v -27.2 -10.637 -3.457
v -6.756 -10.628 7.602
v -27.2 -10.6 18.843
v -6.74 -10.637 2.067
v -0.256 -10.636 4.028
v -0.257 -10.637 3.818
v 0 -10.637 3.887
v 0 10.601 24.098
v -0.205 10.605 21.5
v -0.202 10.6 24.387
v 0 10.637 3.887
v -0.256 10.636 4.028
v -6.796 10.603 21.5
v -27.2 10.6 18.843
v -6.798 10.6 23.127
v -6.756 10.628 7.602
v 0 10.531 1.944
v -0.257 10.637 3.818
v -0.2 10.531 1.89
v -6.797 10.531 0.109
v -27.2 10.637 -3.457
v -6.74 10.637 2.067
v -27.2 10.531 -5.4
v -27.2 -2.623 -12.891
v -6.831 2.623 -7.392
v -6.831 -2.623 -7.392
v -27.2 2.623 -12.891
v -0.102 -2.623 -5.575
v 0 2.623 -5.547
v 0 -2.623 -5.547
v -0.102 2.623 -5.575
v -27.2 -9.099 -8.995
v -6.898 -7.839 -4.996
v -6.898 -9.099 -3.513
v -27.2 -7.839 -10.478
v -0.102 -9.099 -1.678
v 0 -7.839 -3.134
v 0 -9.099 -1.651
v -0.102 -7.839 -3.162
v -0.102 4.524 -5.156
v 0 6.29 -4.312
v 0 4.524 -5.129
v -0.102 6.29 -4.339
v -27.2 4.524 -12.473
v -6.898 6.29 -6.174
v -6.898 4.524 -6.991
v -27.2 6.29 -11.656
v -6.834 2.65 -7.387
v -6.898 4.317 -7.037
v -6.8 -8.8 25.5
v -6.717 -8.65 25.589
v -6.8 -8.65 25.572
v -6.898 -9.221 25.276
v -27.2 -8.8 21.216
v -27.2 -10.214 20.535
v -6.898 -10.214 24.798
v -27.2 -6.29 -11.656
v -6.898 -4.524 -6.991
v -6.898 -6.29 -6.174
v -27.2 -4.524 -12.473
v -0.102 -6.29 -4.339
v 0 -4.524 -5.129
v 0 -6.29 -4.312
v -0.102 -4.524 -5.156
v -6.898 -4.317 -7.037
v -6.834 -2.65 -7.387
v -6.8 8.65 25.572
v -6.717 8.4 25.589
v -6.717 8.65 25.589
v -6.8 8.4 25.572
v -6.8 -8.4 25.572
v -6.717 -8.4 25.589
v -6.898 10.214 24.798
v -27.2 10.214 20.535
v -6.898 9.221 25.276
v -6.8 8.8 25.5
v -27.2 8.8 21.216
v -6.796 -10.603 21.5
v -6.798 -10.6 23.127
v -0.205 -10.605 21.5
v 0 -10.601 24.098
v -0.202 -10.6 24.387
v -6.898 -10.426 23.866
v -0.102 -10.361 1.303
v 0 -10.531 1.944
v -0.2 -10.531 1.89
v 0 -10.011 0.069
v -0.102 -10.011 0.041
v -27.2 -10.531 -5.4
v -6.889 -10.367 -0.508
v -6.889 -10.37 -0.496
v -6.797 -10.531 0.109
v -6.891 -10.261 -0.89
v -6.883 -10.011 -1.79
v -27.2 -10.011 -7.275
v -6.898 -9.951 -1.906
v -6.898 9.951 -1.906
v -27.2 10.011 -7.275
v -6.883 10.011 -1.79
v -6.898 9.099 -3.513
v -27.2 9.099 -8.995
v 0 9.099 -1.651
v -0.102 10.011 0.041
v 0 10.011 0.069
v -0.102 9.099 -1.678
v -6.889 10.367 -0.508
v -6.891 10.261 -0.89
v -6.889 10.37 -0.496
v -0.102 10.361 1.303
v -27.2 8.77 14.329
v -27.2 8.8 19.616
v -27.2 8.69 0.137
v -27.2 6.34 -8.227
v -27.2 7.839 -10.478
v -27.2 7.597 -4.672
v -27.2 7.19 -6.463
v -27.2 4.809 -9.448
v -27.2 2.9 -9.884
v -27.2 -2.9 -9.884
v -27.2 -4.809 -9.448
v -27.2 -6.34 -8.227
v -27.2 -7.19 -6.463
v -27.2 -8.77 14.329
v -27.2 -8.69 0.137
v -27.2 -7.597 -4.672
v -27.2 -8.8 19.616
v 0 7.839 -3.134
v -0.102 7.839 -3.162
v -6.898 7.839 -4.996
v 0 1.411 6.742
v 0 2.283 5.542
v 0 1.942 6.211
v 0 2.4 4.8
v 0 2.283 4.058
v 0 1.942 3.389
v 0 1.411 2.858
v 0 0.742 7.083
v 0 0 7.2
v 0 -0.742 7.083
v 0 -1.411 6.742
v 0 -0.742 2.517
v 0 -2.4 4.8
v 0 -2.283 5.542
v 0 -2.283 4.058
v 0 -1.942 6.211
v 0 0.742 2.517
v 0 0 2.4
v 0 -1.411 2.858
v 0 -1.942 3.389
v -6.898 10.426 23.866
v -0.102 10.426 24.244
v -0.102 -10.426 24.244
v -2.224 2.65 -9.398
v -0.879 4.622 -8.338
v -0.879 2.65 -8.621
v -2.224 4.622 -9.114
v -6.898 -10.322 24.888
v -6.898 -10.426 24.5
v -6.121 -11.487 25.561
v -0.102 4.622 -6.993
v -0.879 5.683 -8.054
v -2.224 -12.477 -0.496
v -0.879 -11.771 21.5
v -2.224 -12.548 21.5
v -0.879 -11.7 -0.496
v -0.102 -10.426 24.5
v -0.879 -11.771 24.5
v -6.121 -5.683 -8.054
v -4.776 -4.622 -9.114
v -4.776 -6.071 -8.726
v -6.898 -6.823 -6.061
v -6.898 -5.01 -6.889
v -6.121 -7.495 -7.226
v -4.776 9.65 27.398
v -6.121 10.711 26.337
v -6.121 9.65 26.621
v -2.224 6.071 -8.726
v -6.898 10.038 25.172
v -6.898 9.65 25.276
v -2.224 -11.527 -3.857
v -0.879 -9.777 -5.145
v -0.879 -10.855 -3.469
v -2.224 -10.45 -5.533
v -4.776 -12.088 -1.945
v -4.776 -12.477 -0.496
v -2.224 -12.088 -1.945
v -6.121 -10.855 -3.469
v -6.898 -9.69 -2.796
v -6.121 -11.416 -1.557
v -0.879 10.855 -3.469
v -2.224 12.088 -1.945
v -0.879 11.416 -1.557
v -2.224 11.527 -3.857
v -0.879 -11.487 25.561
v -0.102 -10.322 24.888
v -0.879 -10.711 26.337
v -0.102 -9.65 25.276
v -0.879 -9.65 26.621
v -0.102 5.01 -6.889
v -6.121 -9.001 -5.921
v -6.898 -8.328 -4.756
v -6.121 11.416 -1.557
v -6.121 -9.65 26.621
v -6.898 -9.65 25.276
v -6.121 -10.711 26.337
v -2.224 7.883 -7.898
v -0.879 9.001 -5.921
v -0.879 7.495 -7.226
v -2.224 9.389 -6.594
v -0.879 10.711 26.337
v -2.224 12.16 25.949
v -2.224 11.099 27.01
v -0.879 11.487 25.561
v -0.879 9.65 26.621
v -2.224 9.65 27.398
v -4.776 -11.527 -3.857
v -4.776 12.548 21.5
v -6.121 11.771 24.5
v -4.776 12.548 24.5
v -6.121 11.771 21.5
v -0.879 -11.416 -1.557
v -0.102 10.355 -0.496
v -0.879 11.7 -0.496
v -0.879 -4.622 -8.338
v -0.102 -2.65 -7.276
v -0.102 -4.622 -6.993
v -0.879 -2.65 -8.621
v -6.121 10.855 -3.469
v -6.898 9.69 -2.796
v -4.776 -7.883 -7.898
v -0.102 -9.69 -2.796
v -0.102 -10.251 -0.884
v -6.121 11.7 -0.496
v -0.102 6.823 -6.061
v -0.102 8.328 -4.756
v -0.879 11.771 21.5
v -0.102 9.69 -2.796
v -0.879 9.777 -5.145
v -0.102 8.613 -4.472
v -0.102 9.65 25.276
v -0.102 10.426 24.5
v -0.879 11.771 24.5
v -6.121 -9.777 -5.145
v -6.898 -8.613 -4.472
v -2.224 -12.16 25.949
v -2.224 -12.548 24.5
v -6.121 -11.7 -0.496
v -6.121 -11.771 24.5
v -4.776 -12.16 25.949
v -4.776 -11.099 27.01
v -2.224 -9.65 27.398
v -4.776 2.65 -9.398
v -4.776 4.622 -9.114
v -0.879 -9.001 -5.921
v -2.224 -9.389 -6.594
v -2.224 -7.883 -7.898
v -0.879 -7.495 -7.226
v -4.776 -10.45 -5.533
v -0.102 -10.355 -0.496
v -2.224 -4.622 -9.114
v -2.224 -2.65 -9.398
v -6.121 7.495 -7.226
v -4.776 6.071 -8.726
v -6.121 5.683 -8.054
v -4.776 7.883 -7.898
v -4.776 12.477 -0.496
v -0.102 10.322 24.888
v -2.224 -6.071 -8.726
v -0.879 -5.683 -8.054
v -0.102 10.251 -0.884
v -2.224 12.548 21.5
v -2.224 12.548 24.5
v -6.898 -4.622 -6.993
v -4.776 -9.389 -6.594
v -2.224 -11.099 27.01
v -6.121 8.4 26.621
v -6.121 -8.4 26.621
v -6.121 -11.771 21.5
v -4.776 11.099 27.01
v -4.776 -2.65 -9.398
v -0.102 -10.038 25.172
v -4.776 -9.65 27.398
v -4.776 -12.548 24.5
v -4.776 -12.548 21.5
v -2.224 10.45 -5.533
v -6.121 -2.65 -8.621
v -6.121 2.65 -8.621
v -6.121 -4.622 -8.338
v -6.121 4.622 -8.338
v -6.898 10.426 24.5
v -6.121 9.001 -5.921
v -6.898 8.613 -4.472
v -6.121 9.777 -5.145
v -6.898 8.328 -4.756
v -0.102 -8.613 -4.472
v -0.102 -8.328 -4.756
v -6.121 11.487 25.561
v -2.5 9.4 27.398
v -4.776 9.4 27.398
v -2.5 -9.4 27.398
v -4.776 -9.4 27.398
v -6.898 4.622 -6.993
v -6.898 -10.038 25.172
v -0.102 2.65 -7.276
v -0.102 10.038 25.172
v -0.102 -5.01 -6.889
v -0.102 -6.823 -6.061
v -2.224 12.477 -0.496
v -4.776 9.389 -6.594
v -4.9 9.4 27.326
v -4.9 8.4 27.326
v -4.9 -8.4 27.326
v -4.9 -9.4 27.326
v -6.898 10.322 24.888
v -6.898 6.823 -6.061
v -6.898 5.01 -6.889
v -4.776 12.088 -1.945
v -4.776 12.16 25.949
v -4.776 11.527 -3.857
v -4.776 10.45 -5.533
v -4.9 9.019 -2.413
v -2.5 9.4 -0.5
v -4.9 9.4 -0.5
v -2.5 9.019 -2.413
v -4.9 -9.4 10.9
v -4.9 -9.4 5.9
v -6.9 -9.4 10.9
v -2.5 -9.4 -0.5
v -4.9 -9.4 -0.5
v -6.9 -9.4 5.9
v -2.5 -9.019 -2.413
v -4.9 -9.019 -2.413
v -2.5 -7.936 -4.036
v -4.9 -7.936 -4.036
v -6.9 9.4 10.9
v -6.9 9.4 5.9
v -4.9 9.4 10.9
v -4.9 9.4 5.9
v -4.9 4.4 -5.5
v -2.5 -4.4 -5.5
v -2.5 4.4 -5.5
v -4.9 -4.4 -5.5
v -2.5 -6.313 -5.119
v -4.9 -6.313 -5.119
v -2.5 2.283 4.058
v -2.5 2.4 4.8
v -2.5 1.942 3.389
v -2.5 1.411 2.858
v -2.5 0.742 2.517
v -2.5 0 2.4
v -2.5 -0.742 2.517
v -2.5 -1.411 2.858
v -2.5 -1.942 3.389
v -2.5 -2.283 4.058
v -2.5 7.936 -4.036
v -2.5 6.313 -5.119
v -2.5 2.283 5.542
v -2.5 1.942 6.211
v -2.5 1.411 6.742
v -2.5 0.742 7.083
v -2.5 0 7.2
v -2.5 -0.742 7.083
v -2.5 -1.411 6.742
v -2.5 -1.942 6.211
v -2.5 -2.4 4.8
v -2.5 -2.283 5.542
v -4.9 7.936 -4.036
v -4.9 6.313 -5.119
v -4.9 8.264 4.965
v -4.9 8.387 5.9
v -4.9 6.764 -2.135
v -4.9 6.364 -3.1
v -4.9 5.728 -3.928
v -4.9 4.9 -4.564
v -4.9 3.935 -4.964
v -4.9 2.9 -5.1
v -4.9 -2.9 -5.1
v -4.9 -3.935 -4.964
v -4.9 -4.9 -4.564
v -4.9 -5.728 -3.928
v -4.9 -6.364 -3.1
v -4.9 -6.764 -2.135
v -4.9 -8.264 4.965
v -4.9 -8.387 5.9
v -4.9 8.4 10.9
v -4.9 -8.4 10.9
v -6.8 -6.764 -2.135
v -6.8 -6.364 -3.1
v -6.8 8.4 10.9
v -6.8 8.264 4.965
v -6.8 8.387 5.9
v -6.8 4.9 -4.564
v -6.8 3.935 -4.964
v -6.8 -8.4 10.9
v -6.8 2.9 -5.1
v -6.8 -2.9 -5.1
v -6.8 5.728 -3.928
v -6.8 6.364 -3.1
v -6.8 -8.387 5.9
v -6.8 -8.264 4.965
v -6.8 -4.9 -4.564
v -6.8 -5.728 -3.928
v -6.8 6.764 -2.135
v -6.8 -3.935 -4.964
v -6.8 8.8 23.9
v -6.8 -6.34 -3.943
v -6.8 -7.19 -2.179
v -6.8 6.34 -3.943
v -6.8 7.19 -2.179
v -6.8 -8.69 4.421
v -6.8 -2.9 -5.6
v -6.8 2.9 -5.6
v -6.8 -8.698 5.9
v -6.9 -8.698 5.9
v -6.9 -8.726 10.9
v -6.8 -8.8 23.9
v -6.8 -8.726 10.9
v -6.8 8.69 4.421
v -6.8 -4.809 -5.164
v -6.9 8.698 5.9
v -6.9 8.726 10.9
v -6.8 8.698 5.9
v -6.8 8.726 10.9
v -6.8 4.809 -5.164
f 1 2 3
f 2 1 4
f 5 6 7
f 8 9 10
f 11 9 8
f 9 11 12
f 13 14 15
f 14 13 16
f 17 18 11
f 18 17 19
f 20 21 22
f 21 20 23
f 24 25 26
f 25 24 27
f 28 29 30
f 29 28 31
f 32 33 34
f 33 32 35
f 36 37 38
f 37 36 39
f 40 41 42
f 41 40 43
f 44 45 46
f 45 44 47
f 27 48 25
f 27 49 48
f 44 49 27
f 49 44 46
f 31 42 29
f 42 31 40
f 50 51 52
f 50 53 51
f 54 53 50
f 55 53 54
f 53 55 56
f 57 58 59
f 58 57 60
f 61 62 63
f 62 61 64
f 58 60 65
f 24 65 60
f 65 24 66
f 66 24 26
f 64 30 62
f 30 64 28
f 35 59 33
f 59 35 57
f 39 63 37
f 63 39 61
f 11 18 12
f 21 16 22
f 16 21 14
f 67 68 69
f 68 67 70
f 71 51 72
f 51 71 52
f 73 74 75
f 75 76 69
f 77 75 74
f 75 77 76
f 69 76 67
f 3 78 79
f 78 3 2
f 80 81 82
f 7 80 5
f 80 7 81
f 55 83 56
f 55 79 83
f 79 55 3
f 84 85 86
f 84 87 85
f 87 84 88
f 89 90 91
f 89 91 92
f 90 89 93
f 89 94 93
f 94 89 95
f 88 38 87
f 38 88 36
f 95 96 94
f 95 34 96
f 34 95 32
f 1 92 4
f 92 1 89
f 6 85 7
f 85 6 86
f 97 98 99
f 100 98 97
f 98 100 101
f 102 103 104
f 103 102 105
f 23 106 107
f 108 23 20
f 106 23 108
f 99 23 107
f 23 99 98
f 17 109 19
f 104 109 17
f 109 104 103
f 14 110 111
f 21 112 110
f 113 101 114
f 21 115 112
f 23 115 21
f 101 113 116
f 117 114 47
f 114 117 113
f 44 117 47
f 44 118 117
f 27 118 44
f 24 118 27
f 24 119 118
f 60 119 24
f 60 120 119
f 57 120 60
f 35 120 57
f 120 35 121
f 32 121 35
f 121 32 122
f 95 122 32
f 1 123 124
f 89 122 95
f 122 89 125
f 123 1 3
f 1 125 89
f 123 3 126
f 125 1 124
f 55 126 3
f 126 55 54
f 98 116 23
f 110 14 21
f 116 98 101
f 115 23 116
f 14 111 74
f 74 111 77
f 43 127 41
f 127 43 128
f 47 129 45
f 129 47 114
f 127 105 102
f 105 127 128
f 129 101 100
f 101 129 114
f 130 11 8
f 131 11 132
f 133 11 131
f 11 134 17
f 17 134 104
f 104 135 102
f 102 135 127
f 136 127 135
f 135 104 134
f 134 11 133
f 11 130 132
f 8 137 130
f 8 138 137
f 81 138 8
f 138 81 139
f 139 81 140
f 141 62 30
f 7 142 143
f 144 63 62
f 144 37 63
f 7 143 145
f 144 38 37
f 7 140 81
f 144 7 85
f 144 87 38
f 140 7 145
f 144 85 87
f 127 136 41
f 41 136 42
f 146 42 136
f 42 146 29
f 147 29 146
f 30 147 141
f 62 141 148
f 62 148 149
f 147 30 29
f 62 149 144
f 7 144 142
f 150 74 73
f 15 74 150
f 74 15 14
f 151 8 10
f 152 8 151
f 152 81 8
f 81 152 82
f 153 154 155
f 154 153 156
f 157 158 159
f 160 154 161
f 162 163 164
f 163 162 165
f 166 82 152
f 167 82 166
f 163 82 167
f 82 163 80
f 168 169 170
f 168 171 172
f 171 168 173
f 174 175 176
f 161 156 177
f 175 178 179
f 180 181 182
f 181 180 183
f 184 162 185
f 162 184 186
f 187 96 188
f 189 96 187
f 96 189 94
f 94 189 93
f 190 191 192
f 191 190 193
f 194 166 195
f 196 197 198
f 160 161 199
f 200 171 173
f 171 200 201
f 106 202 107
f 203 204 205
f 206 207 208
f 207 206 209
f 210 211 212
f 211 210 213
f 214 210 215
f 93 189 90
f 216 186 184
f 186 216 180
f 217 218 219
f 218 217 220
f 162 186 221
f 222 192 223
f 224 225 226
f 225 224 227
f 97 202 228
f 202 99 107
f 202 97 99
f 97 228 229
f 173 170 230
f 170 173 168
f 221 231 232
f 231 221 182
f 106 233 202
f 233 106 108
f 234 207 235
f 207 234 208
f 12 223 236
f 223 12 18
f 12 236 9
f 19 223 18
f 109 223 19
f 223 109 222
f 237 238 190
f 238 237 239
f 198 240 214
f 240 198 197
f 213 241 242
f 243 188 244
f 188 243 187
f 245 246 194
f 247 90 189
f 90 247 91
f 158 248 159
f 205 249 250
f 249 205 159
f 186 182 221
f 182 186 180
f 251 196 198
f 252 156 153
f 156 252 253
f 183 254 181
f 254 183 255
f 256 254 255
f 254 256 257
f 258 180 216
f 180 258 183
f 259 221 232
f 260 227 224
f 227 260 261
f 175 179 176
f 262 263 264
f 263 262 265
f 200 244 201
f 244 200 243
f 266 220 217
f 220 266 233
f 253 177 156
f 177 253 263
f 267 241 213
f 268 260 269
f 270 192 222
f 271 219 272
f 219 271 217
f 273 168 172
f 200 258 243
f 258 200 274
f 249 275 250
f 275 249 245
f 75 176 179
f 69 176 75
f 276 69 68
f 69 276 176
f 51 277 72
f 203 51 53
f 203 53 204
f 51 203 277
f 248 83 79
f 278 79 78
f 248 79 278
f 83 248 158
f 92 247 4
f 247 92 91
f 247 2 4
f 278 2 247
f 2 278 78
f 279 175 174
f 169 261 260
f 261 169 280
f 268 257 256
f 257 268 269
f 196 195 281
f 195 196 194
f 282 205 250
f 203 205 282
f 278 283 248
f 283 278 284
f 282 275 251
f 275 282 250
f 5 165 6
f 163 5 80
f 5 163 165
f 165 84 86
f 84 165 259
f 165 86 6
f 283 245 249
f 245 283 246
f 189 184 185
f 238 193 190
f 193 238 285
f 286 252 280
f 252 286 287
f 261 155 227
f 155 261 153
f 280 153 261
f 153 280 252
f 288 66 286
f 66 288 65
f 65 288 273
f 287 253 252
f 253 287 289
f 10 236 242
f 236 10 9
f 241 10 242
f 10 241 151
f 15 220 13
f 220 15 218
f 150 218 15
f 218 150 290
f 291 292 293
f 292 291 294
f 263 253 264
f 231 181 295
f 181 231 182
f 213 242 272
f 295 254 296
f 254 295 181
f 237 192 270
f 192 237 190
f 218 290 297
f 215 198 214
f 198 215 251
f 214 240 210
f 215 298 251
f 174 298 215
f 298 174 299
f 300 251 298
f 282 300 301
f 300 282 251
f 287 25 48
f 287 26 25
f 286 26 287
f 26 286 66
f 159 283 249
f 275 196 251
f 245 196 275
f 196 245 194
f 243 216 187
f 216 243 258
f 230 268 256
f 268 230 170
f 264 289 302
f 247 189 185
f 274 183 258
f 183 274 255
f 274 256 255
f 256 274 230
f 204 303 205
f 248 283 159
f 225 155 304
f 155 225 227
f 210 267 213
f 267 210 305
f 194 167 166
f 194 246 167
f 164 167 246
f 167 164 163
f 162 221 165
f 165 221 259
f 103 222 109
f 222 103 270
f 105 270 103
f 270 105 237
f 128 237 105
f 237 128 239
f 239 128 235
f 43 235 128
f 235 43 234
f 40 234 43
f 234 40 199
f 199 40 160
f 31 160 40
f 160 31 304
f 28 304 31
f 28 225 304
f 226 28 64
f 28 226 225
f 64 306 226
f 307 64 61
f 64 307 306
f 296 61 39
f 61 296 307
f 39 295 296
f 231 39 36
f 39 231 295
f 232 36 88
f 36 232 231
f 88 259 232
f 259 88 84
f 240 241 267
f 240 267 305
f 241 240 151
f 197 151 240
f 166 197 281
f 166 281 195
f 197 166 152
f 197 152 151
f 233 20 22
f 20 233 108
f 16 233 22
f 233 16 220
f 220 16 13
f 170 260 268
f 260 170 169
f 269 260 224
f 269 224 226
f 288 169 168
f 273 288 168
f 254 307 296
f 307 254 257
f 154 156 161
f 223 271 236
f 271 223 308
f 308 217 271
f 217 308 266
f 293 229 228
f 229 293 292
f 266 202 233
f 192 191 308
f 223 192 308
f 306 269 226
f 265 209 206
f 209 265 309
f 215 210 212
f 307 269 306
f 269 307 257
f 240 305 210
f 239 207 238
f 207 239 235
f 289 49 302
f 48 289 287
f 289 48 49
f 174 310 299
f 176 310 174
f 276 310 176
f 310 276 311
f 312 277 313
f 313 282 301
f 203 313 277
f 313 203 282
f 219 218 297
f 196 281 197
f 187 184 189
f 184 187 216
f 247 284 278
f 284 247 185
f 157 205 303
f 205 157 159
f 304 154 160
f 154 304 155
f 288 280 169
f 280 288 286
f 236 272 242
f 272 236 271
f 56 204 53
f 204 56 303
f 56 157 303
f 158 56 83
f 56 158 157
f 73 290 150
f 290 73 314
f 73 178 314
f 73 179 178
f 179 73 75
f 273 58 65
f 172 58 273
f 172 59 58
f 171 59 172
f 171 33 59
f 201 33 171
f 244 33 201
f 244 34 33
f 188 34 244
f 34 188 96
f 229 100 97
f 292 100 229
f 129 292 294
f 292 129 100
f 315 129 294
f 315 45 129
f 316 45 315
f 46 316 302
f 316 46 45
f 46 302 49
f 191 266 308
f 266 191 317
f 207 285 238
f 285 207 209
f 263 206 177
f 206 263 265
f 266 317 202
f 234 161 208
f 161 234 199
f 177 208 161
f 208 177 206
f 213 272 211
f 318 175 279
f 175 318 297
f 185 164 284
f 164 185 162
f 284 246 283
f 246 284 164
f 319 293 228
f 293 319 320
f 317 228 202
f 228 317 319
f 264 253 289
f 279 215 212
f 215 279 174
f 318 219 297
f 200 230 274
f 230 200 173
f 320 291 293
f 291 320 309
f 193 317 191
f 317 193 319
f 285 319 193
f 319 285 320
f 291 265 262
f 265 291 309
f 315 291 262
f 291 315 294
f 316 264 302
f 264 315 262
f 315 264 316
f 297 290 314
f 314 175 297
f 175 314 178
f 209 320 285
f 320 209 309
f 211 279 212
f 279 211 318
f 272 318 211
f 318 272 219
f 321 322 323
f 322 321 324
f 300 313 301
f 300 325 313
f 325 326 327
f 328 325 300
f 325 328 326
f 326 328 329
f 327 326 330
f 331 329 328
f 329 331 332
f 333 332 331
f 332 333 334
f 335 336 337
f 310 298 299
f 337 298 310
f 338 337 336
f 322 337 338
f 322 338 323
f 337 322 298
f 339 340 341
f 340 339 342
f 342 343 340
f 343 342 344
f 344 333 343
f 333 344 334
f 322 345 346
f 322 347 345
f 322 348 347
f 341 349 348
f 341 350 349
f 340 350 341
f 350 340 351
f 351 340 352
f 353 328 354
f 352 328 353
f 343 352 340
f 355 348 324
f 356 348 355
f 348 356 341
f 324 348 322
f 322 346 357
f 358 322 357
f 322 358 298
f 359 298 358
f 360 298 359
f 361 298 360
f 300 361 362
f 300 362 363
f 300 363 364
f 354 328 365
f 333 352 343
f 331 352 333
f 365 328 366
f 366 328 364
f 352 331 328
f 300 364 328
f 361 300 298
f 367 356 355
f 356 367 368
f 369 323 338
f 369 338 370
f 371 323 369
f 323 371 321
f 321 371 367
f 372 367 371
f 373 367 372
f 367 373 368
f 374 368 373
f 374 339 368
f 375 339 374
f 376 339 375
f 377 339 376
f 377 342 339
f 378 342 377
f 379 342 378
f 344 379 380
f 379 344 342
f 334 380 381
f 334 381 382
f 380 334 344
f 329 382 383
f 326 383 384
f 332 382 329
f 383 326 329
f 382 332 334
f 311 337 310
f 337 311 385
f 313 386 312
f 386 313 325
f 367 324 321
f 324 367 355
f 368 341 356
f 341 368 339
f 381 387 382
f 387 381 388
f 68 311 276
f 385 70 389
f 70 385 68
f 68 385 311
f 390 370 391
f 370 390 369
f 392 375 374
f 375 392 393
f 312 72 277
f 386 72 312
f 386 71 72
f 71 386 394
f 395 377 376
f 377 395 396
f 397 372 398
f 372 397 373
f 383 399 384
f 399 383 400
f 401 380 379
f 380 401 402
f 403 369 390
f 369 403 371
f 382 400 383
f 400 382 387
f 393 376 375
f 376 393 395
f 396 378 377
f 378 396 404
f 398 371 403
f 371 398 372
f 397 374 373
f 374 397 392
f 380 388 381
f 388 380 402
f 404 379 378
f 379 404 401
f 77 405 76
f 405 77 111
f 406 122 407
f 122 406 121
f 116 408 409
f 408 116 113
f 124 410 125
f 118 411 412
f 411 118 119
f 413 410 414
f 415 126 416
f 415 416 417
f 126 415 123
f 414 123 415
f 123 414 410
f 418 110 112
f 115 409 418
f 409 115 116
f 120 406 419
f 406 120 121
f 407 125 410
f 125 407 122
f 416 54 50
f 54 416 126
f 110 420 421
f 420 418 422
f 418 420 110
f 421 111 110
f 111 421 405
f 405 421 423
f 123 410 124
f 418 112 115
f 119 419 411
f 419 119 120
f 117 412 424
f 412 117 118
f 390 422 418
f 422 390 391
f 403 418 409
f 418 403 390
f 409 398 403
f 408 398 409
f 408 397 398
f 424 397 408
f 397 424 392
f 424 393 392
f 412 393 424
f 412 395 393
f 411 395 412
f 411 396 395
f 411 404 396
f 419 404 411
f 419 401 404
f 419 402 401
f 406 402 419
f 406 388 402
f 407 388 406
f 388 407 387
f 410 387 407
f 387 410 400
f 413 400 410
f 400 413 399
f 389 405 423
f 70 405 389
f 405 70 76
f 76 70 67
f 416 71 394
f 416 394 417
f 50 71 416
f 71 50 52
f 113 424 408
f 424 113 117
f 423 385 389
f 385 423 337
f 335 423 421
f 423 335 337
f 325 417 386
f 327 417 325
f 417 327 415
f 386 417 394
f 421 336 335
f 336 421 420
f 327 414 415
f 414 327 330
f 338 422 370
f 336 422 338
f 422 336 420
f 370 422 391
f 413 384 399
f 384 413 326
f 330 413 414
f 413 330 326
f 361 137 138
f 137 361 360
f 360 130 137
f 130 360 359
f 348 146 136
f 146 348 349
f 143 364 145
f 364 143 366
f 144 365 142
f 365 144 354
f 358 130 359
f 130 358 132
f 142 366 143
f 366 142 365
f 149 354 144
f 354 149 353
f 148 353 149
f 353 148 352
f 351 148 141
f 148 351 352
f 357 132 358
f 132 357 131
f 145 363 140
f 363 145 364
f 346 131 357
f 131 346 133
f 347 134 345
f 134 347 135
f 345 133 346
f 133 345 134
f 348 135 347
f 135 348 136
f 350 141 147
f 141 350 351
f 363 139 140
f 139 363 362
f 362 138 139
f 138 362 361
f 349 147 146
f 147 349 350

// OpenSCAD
//
// An extended bottom plate for the ETS 9-round magazine for Glock 42
//
// Copyright (c) 2019 Pete Zaitcev
//

// This is only an approximation. Actually the grip is a little narrower
// in the front than in the back. So, it mostly serves as a comment.
grip_w = 21.3;

module outer_mold () {

    strap_h = 27.2;
    front_r = 9.0;

    rear_r = 2.0;

    base_mr = 3.0;
    base_h = 7.0 - base_mr * 2;
    fr_base_r = 7.0;
    base_w = grip_w - base_mr * 2 + 4.0;

    off1 = grip_w / 2 - front_r;
    off2 = grip_w / 2 - rear_r;

    off_b1 = base_w / 2 - fr_base_r;

    // The main, taller part of the wrapping grip
    difference () {
        hull () {

            // This multmatrix is for the front strap.
            multmatrix(m = [[   1,   0,  -0.27,  0],
                            [   0,   1,   0,     0],
                            [   0,   0,   1,     0],
                            [   0,   0,   0,     1]])
            {

                translate([3.4, off1, strap_h/2])
                    cylinder(strap_h, front_r, front_r, center=true);
                translate([3.4, off1*-1, strap_h/2])
                    cylinder(strap_h, front_r, front_r, center=true);
            }

            // The tilt of the rear cut differs and matches the magazine.
            multmatrix(m = [[   1,   0,  -0.210, 0],
                            [   0,   1,   0,     0],
                            [   0,   0,   1,     0],
                            [   0,   0,   0,     1]])
            {
                translate([25.0, off2, strap_h/2])
                    cylinder(strap_h, rear_r, rear_r, center=true);
                translate([25.0, off2*-1, strap_h/2])
                    cylinder(strap_h, rear_r, rear_r, center=true);
            }
        }

        // A mostly cosmetic cut at the rear bottom
        translate([26.6, 0, -1.3])
            rotate(55, [0,1,0])
                cube([5, 30, 5], center=true);
    }

    // The base that adds rigidity and serves as a handle at the bottom
    minkowski () {
        hull () {
            translate([0.5, off_b1, base_h/2 + base_mr])
                cylinder(base_h, fr_base_r, fr_base_r, center=true);
            translate([0.5, off_b1*-1, base_h/2 + base_mr])
                cylinder(base_h, fr_base_r, fr_base_r, center=true);
            translate([23.0, 0, base_h/2 + base_mr])
                cube([3, base_w, base_h], center=true);
        }
        sphere(base_mr, $fn = 12);
    }
}

module main_cavity () {

    rail_h = 2.4;
    rail_w = 18.8;
    rail_r = 5.0;
    off_rail = rail_w/2 - rail_r;

    flange_h = 2.1; // actual 2.32, but material prints wider
    flange_w = 16.8;
    flange_r = 4.0;
    off_flange_2 = flange_w/2 - flange_r;
    off_flange_1 = flange_w/2 - flange_r - 1.5;

    cav_d = 40;    // magazine depth (at horizontal) is 30.6
    cav_w = 17.6;  // remember that the nose is narrower, to be done later
    cav_h = 28;    // bigger than strap_h
    cav_r = 4.4;
    off_cav_2 = cav_w/2 - cav_r;
    off_cav_1 = cav_w/2 - cav_r - 1.5;  // nose is significantly narrower

    // Layer 1 (from the bottom of the magazine body): the rail
    translate([0, 0, 0]) {
        hull () {
            translate([-0.5, off_rail, rail_h/2])
                cylinder(rail_h, rail_r, rail_r, center=true);
            translate([-0.5, off_rail*-1, rail_h/2])
                cylinder(rail_h, rail_r, rail_r, center=true);
            translate([26.0, 0, rail_h/2])
                cube([3, rail_w, rail_h], center=true);
        }
    }

    // Layer 2: the flange
    translate([0, 0, rail_h - 0.1]) {
        hull () {
            $fn = 24;

            translate([-1.1, off_flange_1, flange_h/2])
                cylinder(flange_h, flange_r, flange_r, center=true);
            translate([-1.1, off_flange_1*-1, flange_h/2])
                cylinder(flange_h, flange_r, flange_r, center=true);

            // middle
            translate([6.0, off_flange_2, flange_h/2])
                cylinder(flange_h, flange_r, flange_r, center=true);
            translate([6.0, off_flange_2*-1, flange_h/2])
                cylinder(flange_h, flange_r, flange_r, center=true);

            translate([26.0, 0, flange_h/2])
                cube([3, flange_w, flange_h], center=true);
        }
    }

    // Layer 3: the main body of the cavity
    translate([-1.6, 0, rail_h + flange_h - 0.2]) {

        multmatrix(m = [[   1,   0,  -0.210, 0],
                        [   0,   1,   0,     0],
                        [   0,   0,   1,     0],
                        [   0,   0,   0,     1]])
        {
            hull () {

                // front
                translate([0.4, off_cav_1, cav_h/2])
                    cylinder(cav_h, cav_r, cav_r, center=true);
                translate([0.4, off_cav_1*-1, cav_h/2])
                    cylinder(cav_h, cav_r, cav_r, center=true);

                // middle
                // The bend here is not cav_r, but whatever, this works.
                translate([7.0, off_cav_2, cav_h/2])
                    cylinder(cav_h, cav_r, cav_r, center=true);
                translate([7.0, off_cav_2*-1, cav_h/2])
                    cylinder(cav_h, cav_r, cav_r, center=true);

                // rear
                translate([27.0, 0, cav_h/2])
                    cube([3, cav_w, cav_h], center=true);
            }
        }
    }

    // Finally, tabs that cross layers 1 and 2
    translate([8.4, 0, 0]) {
        tab_h = rail_h + flange_h - 0.1;
        translate([0, 0, tab_h/2])
            cube([5.0, rail_w, tab_h], center=true);
    }
}

module design () {

    difference () {

        outer_mold();

        // 2.5 is the thickness of the bottom of the factory plate
        translate([0, 0, 2.5])
            main_cavity();

        // Lock hole for the inside bottom plate
        translate([4.8, 0, -0.1])
            cylinder(2.7, 2.4, 2.4, $fn=20);
    }
}

rotate(-90, [0,1,0])
    design();
